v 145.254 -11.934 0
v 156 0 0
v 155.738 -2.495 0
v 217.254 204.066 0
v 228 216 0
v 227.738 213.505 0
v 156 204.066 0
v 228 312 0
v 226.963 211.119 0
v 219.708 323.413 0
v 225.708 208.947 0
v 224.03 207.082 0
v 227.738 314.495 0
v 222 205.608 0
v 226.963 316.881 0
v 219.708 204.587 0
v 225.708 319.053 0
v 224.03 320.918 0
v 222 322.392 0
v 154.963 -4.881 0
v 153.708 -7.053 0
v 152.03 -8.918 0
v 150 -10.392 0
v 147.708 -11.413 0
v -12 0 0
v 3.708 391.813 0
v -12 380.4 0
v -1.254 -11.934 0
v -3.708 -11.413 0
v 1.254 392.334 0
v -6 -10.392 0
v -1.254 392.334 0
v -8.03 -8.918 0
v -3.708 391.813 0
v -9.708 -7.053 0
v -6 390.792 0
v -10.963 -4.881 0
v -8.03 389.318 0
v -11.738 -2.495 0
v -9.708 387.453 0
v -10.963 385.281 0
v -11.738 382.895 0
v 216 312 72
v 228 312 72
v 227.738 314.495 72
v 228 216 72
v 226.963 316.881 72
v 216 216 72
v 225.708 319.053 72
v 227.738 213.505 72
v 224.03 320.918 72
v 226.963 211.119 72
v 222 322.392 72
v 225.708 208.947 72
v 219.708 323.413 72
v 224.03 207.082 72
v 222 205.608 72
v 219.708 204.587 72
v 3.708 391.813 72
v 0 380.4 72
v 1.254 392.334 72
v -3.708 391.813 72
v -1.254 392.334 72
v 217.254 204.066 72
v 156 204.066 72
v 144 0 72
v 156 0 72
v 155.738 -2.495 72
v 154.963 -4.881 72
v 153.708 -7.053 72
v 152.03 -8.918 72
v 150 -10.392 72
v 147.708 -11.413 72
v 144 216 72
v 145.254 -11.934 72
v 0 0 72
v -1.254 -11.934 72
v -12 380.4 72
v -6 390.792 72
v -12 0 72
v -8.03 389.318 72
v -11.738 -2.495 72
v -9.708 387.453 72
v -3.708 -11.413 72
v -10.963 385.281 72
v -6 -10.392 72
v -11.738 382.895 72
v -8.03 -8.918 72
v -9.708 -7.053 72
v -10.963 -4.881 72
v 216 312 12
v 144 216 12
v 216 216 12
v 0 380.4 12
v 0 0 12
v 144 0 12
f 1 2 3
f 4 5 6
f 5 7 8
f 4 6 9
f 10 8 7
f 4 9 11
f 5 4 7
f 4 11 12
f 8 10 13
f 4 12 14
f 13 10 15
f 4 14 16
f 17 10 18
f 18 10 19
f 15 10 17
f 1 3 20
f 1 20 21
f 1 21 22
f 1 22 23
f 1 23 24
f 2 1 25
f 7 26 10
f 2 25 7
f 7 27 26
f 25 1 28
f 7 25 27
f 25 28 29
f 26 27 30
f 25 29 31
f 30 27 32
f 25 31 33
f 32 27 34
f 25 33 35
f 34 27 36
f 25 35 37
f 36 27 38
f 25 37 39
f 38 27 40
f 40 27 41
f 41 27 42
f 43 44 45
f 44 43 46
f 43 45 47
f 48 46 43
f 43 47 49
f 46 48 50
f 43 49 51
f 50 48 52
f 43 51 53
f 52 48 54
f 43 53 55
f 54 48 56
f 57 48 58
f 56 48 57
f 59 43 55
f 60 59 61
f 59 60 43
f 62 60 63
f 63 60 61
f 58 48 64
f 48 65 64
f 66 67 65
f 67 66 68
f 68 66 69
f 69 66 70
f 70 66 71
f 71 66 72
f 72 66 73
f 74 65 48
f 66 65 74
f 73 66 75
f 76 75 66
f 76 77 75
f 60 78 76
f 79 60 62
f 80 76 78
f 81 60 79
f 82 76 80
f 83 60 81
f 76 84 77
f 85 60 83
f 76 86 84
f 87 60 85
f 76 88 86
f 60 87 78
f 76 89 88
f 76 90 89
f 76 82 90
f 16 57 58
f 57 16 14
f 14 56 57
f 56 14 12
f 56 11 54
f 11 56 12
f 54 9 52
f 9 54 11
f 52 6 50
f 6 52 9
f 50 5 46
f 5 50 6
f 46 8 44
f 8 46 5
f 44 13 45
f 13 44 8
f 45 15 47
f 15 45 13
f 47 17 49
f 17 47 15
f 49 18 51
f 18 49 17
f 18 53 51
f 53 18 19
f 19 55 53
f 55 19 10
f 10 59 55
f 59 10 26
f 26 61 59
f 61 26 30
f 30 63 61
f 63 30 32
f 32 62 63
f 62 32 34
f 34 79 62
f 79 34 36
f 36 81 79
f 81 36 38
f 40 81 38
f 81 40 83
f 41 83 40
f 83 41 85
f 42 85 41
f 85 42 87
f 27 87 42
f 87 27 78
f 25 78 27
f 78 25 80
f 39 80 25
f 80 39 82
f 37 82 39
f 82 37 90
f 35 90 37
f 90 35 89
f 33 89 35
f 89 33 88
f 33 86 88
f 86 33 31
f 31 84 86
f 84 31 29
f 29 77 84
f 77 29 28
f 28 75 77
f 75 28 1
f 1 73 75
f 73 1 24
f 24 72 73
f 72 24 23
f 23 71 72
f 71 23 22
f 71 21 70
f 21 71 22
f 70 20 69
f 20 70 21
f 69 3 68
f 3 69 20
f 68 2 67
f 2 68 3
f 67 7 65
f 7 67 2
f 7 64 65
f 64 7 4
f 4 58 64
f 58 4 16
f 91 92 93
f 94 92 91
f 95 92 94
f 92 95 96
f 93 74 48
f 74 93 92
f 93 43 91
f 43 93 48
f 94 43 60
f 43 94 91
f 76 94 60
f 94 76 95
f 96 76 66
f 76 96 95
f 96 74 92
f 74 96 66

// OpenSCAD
                                    function feet(num) = num * 12;

module pool() {
    module pool_shape() {    
        polygon([
          [0,0],
          [feet(12),0],
          [feet(12),feet(18)], 
          [feet(18),feet(18)],
          [feet(18),feet(26)],
          [feet(0),feet(31.7)],
        ]);
    }
    
    module deep_end_bench() {
        linear_extrude(feet(3.5)) polygon([
          [feet(16),feet(18)],
          [feet(18),feet(18)],
          [feet(18),feet(26)],
          [feet(16),feet(27)],
        ]);
    }
    
    module deep_end_corner() {
        bench_size = feet(3); 
        linear_extrude(feet(3.5)) polygon([
          [feet(0),feet(31.7)],
          [bench_size,feet(31.7)],
          [feet(0),feet(31.7) - bench_size],
        ]);
    }
    
    module grand_entrance() {
        linear_extrude(feet(4.5)) polygon([
          [0,0],
          [feet(12),0],
          [feet(12),feet(6)], 
          [feet(0),feet(6)],
        ]);
        linear_extrude(feet(3.5)) polygon([
          [feet(0),feet(6)],
          [feet(12),feet(6)],
          [feet(12),feet(7)], 
          [feet(0),feet(7)],
        ]);
        linear_extrude(feet(2.5)) polygon([
          [feet(0),feet(7)],
          [feet(12),feet(7)],
          [feet(12),feet(8)], 
          [feet(0),feet(8)],
        ]);
    }  
    
    difference() {
        linear_extrude(feet(6)) minkowski() {
          pool_shape();
          circle(feet(1));
        }
        translate([0,0,feet(1)]) linear_extrude(height=feet(5)) pool_shape();
    }
    //translate([0,0,feet(1)]) grand_entrance();
    //translate([0,0,feet(1)]) deep_end_bench();
    //translate([0,0,feet(1)]) deep_end_corner();

}

pool();
